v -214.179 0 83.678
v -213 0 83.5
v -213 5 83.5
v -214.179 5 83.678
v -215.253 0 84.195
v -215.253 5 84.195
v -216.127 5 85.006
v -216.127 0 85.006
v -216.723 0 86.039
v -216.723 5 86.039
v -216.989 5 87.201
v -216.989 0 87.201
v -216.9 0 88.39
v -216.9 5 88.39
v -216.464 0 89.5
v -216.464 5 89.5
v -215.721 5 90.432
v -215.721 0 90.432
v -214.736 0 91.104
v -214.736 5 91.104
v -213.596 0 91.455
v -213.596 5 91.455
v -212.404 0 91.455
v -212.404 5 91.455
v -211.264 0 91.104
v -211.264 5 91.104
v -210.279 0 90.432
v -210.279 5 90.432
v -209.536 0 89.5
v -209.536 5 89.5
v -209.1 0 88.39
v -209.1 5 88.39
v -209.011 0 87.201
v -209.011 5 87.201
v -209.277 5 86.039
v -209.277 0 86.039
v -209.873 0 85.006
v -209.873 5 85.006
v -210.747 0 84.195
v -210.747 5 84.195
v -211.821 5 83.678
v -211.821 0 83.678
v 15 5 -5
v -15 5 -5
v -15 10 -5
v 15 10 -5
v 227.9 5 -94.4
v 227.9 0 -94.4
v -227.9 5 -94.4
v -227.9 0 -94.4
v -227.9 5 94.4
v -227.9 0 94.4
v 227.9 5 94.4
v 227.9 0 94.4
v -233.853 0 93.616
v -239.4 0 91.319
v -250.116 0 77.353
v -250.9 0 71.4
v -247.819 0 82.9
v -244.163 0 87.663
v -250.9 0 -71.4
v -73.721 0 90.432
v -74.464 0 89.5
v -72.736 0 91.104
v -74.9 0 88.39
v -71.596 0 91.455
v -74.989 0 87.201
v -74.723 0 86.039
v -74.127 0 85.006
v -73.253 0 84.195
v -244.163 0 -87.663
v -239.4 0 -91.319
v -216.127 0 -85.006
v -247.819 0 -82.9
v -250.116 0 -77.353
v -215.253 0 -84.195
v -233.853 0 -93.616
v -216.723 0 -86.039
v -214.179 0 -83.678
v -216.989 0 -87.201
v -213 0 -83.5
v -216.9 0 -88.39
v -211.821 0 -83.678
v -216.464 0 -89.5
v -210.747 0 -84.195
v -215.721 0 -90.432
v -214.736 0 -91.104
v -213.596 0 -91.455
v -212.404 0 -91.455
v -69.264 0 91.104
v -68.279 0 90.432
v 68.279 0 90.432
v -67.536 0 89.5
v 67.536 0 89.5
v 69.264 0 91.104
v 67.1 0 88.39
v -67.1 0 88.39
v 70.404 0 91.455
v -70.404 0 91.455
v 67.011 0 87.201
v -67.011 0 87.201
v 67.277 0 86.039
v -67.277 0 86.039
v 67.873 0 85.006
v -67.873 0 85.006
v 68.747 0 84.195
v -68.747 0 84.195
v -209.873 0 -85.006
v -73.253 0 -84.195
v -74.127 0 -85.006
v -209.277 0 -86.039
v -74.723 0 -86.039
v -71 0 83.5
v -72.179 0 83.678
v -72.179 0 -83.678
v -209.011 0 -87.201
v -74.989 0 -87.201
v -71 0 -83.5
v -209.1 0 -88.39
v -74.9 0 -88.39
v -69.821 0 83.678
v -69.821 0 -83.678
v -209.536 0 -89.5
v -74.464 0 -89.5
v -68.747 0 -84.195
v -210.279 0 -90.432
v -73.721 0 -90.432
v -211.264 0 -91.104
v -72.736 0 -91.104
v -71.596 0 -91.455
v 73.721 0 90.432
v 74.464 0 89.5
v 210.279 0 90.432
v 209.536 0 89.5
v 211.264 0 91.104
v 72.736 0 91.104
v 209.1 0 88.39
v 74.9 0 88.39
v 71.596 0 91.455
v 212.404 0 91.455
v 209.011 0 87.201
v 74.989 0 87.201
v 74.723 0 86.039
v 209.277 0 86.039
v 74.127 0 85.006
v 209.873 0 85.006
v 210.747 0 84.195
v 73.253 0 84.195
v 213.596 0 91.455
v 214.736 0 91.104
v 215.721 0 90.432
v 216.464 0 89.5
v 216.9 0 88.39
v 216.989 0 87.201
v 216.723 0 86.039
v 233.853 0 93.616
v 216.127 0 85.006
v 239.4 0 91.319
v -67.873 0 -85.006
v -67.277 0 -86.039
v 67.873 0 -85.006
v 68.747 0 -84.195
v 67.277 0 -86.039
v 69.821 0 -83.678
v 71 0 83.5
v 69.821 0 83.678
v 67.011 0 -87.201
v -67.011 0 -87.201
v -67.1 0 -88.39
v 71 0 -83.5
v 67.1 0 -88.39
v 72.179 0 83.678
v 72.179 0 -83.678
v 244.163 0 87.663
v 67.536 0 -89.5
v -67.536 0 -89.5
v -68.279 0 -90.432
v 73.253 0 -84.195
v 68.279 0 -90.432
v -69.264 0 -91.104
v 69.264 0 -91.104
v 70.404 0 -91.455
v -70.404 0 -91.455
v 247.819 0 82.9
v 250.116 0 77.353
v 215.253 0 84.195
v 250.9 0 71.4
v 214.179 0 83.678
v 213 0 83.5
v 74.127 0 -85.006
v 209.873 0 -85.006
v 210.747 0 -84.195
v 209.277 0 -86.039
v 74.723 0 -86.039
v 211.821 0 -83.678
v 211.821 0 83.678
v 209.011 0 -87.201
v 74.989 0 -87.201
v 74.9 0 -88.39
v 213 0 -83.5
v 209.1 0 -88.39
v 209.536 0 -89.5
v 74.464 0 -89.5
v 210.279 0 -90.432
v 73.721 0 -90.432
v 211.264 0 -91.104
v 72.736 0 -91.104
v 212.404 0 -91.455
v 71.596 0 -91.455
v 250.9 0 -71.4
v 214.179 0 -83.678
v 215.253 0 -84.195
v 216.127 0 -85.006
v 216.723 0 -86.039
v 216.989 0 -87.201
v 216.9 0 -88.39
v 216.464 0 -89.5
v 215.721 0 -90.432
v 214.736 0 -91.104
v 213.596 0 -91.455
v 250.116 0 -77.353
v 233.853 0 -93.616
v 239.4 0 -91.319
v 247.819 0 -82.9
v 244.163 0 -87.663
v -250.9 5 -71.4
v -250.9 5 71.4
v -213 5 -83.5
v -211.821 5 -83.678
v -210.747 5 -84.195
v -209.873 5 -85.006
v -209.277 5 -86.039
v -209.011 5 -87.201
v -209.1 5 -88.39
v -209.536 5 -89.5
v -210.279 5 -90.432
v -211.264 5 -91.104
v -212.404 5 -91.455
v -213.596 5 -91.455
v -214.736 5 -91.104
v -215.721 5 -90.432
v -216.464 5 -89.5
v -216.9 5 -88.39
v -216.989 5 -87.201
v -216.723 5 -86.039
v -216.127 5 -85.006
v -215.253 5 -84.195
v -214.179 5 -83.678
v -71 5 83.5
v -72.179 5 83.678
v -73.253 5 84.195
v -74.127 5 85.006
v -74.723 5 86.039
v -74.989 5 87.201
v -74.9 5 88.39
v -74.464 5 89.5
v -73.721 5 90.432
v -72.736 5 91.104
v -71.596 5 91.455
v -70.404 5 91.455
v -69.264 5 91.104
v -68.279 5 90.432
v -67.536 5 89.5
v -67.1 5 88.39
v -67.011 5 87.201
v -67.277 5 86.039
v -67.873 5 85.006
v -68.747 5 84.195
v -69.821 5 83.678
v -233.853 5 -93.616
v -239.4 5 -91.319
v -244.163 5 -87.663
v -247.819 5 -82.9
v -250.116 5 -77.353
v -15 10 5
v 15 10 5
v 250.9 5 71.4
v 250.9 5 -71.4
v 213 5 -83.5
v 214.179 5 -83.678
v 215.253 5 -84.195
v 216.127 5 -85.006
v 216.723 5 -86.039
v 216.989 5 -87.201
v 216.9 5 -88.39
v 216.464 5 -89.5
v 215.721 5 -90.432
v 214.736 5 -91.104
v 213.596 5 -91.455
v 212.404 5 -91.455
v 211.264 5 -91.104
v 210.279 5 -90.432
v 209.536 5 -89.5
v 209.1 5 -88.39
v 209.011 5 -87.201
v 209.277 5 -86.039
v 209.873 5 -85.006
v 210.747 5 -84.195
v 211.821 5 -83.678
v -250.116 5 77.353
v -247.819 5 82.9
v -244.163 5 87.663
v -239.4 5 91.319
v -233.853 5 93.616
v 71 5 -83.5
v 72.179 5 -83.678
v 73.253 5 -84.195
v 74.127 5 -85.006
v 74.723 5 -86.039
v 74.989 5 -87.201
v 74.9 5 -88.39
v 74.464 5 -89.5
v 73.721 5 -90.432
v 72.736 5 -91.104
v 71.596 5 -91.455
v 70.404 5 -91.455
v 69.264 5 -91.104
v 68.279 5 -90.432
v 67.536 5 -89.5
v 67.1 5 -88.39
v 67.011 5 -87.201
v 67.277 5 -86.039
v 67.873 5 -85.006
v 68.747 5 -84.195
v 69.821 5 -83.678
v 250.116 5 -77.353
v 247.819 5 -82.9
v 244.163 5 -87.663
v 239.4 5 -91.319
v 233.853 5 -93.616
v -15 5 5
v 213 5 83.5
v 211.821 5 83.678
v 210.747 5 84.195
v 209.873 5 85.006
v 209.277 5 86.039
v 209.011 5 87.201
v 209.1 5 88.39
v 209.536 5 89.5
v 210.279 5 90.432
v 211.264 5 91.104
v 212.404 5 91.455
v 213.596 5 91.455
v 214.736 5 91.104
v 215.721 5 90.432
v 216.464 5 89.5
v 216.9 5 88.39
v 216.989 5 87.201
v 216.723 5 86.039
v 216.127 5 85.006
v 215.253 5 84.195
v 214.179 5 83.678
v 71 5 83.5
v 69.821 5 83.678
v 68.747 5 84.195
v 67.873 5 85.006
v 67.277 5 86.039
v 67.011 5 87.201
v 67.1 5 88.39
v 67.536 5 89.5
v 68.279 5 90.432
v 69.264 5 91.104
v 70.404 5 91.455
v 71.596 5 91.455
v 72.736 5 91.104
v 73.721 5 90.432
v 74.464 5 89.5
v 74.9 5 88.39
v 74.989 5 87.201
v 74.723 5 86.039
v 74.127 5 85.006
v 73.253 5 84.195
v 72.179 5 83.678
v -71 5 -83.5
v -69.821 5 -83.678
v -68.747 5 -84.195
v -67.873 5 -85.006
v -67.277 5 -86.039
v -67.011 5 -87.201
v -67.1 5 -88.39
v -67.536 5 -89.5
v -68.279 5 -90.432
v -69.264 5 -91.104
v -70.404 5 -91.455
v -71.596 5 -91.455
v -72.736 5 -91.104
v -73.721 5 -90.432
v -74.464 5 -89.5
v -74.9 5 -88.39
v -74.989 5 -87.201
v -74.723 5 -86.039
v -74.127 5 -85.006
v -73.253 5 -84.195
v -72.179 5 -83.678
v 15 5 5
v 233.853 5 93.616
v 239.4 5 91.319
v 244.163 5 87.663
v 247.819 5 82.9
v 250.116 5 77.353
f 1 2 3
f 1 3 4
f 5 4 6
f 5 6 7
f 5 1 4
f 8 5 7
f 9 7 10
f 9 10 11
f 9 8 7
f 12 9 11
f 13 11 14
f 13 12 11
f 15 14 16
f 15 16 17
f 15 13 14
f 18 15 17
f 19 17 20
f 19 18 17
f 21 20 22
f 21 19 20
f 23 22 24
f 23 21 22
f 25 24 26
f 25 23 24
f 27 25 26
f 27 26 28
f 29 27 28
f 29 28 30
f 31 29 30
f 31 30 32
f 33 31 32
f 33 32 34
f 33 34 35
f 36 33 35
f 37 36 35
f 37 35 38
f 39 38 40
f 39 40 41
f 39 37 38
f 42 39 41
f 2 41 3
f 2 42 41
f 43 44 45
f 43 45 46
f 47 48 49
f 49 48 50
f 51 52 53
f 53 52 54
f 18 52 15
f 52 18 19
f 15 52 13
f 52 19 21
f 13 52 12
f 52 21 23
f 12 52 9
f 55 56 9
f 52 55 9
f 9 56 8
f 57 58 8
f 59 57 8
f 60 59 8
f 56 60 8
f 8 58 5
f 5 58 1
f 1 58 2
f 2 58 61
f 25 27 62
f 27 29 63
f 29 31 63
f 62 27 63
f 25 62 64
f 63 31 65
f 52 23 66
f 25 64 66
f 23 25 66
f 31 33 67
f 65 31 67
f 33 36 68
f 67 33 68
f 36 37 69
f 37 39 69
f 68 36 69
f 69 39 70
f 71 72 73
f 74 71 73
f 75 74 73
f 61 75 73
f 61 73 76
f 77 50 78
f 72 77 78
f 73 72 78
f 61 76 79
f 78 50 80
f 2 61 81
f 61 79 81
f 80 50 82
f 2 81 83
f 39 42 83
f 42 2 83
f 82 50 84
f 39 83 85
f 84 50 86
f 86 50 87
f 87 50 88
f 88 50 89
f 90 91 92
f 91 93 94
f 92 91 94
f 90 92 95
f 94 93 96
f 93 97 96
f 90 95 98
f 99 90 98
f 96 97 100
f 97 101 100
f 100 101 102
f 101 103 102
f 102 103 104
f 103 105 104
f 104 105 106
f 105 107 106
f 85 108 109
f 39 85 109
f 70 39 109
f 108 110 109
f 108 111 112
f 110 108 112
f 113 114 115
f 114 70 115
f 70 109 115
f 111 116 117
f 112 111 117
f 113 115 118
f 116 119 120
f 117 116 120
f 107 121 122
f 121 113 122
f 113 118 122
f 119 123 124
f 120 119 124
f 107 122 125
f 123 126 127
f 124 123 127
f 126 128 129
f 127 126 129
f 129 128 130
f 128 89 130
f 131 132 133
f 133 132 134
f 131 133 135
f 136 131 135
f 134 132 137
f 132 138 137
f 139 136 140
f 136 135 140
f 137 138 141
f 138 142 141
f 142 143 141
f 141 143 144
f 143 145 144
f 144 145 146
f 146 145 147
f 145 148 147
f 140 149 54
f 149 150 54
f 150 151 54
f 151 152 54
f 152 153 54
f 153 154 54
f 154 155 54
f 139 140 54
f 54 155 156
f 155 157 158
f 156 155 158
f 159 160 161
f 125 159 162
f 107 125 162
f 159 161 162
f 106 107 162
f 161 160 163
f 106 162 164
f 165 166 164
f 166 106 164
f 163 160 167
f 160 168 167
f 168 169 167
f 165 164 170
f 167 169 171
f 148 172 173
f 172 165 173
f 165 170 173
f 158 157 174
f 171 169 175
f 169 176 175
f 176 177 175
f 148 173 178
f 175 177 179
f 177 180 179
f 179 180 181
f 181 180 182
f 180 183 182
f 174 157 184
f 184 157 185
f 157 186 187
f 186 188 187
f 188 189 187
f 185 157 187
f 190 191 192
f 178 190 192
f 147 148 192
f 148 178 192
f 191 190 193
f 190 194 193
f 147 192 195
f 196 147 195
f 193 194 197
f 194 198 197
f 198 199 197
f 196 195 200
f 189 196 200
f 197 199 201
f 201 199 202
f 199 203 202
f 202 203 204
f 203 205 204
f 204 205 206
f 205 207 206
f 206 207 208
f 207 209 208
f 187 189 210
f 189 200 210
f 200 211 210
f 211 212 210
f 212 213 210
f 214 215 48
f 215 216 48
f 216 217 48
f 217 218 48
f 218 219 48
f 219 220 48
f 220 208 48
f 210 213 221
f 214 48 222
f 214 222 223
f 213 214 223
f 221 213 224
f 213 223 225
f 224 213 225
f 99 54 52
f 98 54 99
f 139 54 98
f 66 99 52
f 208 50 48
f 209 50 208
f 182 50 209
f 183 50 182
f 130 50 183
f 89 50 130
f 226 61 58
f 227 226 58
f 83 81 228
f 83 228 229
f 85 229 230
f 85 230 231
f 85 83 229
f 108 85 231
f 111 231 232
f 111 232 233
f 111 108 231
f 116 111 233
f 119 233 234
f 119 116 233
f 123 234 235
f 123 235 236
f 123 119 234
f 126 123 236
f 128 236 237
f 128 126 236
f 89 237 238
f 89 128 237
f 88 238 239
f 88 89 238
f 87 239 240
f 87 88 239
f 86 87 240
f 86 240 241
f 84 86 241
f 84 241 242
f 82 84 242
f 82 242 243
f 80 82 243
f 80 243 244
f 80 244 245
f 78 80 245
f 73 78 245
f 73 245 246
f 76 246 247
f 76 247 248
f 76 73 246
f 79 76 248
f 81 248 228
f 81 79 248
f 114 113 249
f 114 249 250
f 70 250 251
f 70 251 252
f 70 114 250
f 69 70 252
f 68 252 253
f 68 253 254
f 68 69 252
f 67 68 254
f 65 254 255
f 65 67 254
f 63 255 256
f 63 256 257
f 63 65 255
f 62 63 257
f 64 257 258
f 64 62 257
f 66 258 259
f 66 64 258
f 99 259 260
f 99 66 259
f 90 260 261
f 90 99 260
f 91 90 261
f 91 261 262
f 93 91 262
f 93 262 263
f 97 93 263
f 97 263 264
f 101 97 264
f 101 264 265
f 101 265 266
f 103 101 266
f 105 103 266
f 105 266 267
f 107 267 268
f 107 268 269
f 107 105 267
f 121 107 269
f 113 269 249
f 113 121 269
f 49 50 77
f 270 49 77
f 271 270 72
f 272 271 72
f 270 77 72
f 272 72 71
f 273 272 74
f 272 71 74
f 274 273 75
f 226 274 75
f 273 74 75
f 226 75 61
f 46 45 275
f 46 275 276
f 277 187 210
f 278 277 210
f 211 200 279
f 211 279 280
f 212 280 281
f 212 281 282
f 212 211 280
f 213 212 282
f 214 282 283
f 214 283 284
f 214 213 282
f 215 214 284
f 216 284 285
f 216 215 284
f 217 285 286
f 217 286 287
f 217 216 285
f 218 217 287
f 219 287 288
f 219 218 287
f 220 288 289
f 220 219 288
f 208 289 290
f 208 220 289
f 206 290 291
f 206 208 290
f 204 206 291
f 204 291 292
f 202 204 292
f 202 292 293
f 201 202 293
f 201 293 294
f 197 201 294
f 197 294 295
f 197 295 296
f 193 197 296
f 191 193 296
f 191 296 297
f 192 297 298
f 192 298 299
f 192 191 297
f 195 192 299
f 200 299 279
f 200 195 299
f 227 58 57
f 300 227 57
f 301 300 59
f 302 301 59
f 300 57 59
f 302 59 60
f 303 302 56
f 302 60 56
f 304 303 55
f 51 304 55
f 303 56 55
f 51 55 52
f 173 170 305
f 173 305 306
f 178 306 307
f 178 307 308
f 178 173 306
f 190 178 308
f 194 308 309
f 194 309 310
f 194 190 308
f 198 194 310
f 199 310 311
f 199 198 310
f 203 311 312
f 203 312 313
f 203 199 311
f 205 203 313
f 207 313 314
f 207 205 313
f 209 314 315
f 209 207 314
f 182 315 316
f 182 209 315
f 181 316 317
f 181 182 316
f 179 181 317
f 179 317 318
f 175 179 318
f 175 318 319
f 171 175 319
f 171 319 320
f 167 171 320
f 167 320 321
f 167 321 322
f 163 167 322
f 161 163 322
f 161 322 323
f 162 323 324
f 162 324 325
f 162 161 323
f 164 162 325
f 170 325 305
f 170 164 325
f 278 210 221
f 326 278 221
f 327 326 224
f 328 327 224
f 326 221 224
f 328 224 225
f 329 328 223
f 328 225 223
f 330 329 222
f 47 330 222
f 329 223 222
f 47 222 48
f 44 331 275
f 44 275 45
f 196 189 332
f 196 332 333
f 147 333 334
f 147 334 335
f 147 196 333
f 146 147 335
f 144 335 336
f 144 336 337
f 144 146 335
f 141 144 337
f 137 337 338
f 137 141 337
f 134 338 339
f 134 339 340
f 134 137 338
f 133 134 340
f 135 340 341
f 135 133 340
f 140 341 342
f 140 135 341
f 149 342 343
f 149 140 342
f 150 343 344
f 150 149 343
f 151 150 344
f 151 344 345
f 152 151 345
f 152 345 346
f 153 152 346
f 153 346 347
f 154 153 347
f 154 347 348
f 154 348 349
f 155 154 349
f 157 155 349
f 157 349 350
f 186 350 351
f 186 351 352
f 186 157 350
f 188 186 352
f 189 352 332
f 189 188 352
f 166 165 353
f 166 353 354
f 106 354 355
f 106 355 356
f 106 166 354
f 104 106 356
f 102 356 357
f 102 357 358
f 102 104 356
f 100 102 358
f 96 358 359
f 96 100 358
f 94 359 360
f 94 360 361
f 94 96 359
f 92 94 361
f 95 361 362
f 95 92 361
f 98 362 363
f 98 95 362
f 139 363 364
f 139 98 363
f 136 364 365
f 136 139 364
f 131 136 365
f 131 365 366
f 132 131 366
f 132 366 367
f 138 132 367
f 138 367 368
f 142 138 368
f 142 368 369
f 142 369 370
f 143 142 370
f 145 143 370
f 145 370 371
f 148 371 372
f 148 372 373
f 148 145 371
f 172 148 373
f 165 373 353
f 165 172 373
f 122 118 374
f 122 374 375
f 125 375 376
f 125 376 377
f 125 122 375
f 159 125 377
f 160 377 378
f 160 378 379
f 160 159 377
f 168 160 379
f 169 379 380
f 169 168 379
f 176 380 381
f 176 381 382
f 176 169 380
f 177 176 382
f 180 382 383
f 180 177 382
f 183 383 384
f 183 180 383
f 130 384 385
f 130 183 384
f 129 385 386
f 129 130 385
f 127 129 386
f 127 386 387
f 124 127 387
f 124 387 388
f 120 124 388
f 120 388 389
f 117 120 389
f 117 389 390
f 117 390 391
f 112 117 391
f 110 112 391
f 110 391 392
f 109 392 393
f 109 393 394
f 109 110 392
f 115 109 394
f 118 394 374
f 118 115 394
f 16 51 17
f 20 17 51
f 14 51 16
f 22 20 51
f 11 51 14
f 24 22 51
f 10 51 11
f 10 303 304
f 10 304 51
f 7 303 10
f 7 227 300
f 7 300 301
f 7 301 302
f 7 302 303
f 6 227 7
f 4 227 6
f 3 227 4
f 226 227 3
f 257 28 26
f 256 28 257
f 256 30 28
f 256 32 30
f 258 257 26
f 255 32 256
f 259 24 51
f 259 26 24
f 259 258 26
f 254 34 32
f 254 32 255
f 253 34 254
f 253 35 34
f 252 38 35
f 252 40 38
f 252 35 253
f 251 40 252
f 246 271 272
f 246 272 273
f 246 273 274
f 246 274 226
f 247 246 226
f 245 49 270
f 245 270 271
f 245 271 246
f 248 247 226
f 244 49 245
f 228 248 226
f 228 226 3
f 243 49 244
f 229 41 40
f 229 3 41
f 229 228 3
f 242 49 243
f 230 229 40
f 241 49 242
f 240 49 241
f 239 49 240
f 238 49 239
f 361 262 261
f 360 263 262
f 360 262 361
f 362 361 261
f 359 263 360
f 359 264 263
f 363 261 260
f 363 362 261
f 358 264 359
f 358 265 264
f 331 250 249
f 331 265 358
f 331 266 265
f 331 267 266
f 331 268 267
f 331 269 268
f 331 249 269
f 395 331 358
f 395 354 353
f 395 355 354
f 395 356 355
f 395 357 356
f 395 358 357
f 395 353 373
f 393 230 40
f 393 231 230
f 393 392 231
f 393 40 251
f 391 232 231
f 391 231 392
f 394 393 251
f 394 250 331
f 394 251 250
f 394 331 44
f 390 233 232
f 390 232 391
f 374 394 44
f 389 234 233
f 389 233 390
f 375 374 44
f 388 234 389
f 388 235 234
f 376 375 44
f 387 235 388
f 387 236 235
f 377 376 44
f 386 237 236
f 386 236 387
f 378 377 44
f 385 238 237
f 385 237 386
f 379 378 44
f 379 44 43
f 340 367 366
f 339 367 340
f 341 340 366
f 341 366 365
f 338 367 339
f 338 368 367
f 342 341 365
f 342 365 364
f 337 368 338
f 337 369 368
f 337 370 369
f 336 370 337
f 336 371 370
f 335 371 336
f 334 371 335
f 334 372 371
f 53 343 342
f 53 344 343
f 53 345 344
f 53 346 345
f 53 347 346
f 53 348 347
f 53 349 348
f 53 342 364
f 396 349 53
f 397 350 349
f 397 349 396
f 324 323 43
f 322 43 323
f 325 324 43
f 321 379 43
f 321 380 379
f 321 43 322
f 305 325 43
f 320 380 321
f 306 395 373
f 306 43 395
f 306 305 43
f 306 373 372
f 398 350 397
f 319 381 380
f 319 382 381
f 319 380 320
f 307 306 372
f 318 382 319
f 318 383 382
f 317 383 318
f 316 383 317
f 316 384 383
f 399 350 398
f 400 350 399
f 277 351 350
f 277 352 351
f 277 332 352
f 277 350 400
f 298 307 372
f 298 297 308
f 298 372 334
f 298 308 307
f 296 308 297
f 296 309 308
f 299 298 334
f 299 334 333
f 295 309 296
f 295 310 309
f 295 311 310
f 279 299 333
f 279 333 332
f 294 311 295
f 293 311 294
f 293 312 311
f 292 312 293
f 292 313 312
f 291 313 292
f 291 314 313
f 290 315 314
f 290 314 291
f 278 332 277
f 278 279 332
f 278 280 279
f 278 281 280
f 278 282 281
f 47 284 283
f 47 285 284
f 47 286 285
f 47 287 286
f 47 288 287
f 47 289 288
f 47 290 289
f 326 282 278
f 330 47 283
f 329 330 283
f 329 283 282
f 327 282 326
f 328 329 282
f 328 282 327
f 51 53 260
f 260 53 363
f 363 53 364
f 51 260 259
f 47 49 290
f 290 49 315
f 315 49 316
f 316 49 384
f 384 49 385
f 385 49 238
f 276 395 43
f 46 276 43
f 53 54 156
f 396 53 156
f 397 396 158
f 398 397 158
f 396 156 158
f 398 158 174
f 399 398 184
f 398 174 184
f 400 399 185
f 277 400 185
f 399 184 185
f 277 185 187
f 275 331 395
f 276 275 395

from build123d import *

# Parameters (mm, degrees)
SKETCH2_R           = 4
SKETCH2_W           = 30
SKETCH2_H           = 10
BOSS_EXTRUDE1_DEPTH = 5
SKETCH2_2_W         = 30
SKETCH2_2_H         = 10
BOSS_EXTRUDE2_DEPTH = 10


with BuildPart() as part:
    # Sketch2 → Boss-Extrude1 (new body)
    with BuildSketch(Plane(origin=(0, 0, 0), x_dir=(1, 0, 0), z_dir=(0, 1, 0))):
        with BuildLine():
            Line((-227.9, -94.4), (227.9, -94.4))
            ThreePointArc((227.9, -94.4), (244.163455967, -87.663455967), (250.9, -71.4))
            Line((250.9, -71.4), (250.9, 71.4))
            ThreePointArc((250.9, 71.4), (244.163455967, 87.663455967), (227.9, 94.4))
            Line((227.9, 94.4), (-227.9, 94.4))
            ThreePointArc((-227.9, 94.4), (-244.163455967, 87.663455967), (-250.9, 71.4))
            Line((-250.9, 71.4), (-250.9, -71.4))
            ThreePointArc((-250.9, -71.4), (-244.163455967, -87.663455967), (-227.9, -94.4))
        make_face()
        with Locations((-213, 87.5)):
            Circle(SKETCH2_R, mode=Mode.SUBTRACT)
        with Locations((-71, 87.5)):
            Circle(SKETCH2_R, mode=Mode.SUBTRACT)
        with Locations((71, 87.5)):
            Circle(SKETCH2_R, mode=Mode.SUBTRACT)
        with Locations((213, 87.5)):
            Circle(SKETCH2_R, mode=Mode.SUBTRACT)
        with Locations((213, -87.5)):
            Circle(SKETCH2_R, mode=Mode.SUBTRACT)
        with Locations((71, -87.5)):
            Circle(SKETCH2_R, mode=Mode.SUBTRACT)
        with Locations((-71, -87.5)):
            Circle(SKETCH2_R, mode=Mode.SUBTRACT)
        with Locations((-213, -87.5)):
            Circle(SKETCH2_R, mode=Mode.SUBTRACT)
        Rectangle(SKETCH2_W, SKETCH2_H, mode=Mode.SUBTRACT)
    extrude(amount=BOSS_EXTRUDE1_DEPTH)

    # Sketch2<2> → Boss-Extrude2 (add)
    with BuildSketch(Plane(origin=(0, 0, 0), x_dir=(1, 0, 0), z_dir=(0, 1, 0))):
        Rectangle(SKETCH2_2_W, SKETCH2_2_H)
    extrude(amount=BOSS_EXTRUDE2_DEPTH)


solid = part.part
